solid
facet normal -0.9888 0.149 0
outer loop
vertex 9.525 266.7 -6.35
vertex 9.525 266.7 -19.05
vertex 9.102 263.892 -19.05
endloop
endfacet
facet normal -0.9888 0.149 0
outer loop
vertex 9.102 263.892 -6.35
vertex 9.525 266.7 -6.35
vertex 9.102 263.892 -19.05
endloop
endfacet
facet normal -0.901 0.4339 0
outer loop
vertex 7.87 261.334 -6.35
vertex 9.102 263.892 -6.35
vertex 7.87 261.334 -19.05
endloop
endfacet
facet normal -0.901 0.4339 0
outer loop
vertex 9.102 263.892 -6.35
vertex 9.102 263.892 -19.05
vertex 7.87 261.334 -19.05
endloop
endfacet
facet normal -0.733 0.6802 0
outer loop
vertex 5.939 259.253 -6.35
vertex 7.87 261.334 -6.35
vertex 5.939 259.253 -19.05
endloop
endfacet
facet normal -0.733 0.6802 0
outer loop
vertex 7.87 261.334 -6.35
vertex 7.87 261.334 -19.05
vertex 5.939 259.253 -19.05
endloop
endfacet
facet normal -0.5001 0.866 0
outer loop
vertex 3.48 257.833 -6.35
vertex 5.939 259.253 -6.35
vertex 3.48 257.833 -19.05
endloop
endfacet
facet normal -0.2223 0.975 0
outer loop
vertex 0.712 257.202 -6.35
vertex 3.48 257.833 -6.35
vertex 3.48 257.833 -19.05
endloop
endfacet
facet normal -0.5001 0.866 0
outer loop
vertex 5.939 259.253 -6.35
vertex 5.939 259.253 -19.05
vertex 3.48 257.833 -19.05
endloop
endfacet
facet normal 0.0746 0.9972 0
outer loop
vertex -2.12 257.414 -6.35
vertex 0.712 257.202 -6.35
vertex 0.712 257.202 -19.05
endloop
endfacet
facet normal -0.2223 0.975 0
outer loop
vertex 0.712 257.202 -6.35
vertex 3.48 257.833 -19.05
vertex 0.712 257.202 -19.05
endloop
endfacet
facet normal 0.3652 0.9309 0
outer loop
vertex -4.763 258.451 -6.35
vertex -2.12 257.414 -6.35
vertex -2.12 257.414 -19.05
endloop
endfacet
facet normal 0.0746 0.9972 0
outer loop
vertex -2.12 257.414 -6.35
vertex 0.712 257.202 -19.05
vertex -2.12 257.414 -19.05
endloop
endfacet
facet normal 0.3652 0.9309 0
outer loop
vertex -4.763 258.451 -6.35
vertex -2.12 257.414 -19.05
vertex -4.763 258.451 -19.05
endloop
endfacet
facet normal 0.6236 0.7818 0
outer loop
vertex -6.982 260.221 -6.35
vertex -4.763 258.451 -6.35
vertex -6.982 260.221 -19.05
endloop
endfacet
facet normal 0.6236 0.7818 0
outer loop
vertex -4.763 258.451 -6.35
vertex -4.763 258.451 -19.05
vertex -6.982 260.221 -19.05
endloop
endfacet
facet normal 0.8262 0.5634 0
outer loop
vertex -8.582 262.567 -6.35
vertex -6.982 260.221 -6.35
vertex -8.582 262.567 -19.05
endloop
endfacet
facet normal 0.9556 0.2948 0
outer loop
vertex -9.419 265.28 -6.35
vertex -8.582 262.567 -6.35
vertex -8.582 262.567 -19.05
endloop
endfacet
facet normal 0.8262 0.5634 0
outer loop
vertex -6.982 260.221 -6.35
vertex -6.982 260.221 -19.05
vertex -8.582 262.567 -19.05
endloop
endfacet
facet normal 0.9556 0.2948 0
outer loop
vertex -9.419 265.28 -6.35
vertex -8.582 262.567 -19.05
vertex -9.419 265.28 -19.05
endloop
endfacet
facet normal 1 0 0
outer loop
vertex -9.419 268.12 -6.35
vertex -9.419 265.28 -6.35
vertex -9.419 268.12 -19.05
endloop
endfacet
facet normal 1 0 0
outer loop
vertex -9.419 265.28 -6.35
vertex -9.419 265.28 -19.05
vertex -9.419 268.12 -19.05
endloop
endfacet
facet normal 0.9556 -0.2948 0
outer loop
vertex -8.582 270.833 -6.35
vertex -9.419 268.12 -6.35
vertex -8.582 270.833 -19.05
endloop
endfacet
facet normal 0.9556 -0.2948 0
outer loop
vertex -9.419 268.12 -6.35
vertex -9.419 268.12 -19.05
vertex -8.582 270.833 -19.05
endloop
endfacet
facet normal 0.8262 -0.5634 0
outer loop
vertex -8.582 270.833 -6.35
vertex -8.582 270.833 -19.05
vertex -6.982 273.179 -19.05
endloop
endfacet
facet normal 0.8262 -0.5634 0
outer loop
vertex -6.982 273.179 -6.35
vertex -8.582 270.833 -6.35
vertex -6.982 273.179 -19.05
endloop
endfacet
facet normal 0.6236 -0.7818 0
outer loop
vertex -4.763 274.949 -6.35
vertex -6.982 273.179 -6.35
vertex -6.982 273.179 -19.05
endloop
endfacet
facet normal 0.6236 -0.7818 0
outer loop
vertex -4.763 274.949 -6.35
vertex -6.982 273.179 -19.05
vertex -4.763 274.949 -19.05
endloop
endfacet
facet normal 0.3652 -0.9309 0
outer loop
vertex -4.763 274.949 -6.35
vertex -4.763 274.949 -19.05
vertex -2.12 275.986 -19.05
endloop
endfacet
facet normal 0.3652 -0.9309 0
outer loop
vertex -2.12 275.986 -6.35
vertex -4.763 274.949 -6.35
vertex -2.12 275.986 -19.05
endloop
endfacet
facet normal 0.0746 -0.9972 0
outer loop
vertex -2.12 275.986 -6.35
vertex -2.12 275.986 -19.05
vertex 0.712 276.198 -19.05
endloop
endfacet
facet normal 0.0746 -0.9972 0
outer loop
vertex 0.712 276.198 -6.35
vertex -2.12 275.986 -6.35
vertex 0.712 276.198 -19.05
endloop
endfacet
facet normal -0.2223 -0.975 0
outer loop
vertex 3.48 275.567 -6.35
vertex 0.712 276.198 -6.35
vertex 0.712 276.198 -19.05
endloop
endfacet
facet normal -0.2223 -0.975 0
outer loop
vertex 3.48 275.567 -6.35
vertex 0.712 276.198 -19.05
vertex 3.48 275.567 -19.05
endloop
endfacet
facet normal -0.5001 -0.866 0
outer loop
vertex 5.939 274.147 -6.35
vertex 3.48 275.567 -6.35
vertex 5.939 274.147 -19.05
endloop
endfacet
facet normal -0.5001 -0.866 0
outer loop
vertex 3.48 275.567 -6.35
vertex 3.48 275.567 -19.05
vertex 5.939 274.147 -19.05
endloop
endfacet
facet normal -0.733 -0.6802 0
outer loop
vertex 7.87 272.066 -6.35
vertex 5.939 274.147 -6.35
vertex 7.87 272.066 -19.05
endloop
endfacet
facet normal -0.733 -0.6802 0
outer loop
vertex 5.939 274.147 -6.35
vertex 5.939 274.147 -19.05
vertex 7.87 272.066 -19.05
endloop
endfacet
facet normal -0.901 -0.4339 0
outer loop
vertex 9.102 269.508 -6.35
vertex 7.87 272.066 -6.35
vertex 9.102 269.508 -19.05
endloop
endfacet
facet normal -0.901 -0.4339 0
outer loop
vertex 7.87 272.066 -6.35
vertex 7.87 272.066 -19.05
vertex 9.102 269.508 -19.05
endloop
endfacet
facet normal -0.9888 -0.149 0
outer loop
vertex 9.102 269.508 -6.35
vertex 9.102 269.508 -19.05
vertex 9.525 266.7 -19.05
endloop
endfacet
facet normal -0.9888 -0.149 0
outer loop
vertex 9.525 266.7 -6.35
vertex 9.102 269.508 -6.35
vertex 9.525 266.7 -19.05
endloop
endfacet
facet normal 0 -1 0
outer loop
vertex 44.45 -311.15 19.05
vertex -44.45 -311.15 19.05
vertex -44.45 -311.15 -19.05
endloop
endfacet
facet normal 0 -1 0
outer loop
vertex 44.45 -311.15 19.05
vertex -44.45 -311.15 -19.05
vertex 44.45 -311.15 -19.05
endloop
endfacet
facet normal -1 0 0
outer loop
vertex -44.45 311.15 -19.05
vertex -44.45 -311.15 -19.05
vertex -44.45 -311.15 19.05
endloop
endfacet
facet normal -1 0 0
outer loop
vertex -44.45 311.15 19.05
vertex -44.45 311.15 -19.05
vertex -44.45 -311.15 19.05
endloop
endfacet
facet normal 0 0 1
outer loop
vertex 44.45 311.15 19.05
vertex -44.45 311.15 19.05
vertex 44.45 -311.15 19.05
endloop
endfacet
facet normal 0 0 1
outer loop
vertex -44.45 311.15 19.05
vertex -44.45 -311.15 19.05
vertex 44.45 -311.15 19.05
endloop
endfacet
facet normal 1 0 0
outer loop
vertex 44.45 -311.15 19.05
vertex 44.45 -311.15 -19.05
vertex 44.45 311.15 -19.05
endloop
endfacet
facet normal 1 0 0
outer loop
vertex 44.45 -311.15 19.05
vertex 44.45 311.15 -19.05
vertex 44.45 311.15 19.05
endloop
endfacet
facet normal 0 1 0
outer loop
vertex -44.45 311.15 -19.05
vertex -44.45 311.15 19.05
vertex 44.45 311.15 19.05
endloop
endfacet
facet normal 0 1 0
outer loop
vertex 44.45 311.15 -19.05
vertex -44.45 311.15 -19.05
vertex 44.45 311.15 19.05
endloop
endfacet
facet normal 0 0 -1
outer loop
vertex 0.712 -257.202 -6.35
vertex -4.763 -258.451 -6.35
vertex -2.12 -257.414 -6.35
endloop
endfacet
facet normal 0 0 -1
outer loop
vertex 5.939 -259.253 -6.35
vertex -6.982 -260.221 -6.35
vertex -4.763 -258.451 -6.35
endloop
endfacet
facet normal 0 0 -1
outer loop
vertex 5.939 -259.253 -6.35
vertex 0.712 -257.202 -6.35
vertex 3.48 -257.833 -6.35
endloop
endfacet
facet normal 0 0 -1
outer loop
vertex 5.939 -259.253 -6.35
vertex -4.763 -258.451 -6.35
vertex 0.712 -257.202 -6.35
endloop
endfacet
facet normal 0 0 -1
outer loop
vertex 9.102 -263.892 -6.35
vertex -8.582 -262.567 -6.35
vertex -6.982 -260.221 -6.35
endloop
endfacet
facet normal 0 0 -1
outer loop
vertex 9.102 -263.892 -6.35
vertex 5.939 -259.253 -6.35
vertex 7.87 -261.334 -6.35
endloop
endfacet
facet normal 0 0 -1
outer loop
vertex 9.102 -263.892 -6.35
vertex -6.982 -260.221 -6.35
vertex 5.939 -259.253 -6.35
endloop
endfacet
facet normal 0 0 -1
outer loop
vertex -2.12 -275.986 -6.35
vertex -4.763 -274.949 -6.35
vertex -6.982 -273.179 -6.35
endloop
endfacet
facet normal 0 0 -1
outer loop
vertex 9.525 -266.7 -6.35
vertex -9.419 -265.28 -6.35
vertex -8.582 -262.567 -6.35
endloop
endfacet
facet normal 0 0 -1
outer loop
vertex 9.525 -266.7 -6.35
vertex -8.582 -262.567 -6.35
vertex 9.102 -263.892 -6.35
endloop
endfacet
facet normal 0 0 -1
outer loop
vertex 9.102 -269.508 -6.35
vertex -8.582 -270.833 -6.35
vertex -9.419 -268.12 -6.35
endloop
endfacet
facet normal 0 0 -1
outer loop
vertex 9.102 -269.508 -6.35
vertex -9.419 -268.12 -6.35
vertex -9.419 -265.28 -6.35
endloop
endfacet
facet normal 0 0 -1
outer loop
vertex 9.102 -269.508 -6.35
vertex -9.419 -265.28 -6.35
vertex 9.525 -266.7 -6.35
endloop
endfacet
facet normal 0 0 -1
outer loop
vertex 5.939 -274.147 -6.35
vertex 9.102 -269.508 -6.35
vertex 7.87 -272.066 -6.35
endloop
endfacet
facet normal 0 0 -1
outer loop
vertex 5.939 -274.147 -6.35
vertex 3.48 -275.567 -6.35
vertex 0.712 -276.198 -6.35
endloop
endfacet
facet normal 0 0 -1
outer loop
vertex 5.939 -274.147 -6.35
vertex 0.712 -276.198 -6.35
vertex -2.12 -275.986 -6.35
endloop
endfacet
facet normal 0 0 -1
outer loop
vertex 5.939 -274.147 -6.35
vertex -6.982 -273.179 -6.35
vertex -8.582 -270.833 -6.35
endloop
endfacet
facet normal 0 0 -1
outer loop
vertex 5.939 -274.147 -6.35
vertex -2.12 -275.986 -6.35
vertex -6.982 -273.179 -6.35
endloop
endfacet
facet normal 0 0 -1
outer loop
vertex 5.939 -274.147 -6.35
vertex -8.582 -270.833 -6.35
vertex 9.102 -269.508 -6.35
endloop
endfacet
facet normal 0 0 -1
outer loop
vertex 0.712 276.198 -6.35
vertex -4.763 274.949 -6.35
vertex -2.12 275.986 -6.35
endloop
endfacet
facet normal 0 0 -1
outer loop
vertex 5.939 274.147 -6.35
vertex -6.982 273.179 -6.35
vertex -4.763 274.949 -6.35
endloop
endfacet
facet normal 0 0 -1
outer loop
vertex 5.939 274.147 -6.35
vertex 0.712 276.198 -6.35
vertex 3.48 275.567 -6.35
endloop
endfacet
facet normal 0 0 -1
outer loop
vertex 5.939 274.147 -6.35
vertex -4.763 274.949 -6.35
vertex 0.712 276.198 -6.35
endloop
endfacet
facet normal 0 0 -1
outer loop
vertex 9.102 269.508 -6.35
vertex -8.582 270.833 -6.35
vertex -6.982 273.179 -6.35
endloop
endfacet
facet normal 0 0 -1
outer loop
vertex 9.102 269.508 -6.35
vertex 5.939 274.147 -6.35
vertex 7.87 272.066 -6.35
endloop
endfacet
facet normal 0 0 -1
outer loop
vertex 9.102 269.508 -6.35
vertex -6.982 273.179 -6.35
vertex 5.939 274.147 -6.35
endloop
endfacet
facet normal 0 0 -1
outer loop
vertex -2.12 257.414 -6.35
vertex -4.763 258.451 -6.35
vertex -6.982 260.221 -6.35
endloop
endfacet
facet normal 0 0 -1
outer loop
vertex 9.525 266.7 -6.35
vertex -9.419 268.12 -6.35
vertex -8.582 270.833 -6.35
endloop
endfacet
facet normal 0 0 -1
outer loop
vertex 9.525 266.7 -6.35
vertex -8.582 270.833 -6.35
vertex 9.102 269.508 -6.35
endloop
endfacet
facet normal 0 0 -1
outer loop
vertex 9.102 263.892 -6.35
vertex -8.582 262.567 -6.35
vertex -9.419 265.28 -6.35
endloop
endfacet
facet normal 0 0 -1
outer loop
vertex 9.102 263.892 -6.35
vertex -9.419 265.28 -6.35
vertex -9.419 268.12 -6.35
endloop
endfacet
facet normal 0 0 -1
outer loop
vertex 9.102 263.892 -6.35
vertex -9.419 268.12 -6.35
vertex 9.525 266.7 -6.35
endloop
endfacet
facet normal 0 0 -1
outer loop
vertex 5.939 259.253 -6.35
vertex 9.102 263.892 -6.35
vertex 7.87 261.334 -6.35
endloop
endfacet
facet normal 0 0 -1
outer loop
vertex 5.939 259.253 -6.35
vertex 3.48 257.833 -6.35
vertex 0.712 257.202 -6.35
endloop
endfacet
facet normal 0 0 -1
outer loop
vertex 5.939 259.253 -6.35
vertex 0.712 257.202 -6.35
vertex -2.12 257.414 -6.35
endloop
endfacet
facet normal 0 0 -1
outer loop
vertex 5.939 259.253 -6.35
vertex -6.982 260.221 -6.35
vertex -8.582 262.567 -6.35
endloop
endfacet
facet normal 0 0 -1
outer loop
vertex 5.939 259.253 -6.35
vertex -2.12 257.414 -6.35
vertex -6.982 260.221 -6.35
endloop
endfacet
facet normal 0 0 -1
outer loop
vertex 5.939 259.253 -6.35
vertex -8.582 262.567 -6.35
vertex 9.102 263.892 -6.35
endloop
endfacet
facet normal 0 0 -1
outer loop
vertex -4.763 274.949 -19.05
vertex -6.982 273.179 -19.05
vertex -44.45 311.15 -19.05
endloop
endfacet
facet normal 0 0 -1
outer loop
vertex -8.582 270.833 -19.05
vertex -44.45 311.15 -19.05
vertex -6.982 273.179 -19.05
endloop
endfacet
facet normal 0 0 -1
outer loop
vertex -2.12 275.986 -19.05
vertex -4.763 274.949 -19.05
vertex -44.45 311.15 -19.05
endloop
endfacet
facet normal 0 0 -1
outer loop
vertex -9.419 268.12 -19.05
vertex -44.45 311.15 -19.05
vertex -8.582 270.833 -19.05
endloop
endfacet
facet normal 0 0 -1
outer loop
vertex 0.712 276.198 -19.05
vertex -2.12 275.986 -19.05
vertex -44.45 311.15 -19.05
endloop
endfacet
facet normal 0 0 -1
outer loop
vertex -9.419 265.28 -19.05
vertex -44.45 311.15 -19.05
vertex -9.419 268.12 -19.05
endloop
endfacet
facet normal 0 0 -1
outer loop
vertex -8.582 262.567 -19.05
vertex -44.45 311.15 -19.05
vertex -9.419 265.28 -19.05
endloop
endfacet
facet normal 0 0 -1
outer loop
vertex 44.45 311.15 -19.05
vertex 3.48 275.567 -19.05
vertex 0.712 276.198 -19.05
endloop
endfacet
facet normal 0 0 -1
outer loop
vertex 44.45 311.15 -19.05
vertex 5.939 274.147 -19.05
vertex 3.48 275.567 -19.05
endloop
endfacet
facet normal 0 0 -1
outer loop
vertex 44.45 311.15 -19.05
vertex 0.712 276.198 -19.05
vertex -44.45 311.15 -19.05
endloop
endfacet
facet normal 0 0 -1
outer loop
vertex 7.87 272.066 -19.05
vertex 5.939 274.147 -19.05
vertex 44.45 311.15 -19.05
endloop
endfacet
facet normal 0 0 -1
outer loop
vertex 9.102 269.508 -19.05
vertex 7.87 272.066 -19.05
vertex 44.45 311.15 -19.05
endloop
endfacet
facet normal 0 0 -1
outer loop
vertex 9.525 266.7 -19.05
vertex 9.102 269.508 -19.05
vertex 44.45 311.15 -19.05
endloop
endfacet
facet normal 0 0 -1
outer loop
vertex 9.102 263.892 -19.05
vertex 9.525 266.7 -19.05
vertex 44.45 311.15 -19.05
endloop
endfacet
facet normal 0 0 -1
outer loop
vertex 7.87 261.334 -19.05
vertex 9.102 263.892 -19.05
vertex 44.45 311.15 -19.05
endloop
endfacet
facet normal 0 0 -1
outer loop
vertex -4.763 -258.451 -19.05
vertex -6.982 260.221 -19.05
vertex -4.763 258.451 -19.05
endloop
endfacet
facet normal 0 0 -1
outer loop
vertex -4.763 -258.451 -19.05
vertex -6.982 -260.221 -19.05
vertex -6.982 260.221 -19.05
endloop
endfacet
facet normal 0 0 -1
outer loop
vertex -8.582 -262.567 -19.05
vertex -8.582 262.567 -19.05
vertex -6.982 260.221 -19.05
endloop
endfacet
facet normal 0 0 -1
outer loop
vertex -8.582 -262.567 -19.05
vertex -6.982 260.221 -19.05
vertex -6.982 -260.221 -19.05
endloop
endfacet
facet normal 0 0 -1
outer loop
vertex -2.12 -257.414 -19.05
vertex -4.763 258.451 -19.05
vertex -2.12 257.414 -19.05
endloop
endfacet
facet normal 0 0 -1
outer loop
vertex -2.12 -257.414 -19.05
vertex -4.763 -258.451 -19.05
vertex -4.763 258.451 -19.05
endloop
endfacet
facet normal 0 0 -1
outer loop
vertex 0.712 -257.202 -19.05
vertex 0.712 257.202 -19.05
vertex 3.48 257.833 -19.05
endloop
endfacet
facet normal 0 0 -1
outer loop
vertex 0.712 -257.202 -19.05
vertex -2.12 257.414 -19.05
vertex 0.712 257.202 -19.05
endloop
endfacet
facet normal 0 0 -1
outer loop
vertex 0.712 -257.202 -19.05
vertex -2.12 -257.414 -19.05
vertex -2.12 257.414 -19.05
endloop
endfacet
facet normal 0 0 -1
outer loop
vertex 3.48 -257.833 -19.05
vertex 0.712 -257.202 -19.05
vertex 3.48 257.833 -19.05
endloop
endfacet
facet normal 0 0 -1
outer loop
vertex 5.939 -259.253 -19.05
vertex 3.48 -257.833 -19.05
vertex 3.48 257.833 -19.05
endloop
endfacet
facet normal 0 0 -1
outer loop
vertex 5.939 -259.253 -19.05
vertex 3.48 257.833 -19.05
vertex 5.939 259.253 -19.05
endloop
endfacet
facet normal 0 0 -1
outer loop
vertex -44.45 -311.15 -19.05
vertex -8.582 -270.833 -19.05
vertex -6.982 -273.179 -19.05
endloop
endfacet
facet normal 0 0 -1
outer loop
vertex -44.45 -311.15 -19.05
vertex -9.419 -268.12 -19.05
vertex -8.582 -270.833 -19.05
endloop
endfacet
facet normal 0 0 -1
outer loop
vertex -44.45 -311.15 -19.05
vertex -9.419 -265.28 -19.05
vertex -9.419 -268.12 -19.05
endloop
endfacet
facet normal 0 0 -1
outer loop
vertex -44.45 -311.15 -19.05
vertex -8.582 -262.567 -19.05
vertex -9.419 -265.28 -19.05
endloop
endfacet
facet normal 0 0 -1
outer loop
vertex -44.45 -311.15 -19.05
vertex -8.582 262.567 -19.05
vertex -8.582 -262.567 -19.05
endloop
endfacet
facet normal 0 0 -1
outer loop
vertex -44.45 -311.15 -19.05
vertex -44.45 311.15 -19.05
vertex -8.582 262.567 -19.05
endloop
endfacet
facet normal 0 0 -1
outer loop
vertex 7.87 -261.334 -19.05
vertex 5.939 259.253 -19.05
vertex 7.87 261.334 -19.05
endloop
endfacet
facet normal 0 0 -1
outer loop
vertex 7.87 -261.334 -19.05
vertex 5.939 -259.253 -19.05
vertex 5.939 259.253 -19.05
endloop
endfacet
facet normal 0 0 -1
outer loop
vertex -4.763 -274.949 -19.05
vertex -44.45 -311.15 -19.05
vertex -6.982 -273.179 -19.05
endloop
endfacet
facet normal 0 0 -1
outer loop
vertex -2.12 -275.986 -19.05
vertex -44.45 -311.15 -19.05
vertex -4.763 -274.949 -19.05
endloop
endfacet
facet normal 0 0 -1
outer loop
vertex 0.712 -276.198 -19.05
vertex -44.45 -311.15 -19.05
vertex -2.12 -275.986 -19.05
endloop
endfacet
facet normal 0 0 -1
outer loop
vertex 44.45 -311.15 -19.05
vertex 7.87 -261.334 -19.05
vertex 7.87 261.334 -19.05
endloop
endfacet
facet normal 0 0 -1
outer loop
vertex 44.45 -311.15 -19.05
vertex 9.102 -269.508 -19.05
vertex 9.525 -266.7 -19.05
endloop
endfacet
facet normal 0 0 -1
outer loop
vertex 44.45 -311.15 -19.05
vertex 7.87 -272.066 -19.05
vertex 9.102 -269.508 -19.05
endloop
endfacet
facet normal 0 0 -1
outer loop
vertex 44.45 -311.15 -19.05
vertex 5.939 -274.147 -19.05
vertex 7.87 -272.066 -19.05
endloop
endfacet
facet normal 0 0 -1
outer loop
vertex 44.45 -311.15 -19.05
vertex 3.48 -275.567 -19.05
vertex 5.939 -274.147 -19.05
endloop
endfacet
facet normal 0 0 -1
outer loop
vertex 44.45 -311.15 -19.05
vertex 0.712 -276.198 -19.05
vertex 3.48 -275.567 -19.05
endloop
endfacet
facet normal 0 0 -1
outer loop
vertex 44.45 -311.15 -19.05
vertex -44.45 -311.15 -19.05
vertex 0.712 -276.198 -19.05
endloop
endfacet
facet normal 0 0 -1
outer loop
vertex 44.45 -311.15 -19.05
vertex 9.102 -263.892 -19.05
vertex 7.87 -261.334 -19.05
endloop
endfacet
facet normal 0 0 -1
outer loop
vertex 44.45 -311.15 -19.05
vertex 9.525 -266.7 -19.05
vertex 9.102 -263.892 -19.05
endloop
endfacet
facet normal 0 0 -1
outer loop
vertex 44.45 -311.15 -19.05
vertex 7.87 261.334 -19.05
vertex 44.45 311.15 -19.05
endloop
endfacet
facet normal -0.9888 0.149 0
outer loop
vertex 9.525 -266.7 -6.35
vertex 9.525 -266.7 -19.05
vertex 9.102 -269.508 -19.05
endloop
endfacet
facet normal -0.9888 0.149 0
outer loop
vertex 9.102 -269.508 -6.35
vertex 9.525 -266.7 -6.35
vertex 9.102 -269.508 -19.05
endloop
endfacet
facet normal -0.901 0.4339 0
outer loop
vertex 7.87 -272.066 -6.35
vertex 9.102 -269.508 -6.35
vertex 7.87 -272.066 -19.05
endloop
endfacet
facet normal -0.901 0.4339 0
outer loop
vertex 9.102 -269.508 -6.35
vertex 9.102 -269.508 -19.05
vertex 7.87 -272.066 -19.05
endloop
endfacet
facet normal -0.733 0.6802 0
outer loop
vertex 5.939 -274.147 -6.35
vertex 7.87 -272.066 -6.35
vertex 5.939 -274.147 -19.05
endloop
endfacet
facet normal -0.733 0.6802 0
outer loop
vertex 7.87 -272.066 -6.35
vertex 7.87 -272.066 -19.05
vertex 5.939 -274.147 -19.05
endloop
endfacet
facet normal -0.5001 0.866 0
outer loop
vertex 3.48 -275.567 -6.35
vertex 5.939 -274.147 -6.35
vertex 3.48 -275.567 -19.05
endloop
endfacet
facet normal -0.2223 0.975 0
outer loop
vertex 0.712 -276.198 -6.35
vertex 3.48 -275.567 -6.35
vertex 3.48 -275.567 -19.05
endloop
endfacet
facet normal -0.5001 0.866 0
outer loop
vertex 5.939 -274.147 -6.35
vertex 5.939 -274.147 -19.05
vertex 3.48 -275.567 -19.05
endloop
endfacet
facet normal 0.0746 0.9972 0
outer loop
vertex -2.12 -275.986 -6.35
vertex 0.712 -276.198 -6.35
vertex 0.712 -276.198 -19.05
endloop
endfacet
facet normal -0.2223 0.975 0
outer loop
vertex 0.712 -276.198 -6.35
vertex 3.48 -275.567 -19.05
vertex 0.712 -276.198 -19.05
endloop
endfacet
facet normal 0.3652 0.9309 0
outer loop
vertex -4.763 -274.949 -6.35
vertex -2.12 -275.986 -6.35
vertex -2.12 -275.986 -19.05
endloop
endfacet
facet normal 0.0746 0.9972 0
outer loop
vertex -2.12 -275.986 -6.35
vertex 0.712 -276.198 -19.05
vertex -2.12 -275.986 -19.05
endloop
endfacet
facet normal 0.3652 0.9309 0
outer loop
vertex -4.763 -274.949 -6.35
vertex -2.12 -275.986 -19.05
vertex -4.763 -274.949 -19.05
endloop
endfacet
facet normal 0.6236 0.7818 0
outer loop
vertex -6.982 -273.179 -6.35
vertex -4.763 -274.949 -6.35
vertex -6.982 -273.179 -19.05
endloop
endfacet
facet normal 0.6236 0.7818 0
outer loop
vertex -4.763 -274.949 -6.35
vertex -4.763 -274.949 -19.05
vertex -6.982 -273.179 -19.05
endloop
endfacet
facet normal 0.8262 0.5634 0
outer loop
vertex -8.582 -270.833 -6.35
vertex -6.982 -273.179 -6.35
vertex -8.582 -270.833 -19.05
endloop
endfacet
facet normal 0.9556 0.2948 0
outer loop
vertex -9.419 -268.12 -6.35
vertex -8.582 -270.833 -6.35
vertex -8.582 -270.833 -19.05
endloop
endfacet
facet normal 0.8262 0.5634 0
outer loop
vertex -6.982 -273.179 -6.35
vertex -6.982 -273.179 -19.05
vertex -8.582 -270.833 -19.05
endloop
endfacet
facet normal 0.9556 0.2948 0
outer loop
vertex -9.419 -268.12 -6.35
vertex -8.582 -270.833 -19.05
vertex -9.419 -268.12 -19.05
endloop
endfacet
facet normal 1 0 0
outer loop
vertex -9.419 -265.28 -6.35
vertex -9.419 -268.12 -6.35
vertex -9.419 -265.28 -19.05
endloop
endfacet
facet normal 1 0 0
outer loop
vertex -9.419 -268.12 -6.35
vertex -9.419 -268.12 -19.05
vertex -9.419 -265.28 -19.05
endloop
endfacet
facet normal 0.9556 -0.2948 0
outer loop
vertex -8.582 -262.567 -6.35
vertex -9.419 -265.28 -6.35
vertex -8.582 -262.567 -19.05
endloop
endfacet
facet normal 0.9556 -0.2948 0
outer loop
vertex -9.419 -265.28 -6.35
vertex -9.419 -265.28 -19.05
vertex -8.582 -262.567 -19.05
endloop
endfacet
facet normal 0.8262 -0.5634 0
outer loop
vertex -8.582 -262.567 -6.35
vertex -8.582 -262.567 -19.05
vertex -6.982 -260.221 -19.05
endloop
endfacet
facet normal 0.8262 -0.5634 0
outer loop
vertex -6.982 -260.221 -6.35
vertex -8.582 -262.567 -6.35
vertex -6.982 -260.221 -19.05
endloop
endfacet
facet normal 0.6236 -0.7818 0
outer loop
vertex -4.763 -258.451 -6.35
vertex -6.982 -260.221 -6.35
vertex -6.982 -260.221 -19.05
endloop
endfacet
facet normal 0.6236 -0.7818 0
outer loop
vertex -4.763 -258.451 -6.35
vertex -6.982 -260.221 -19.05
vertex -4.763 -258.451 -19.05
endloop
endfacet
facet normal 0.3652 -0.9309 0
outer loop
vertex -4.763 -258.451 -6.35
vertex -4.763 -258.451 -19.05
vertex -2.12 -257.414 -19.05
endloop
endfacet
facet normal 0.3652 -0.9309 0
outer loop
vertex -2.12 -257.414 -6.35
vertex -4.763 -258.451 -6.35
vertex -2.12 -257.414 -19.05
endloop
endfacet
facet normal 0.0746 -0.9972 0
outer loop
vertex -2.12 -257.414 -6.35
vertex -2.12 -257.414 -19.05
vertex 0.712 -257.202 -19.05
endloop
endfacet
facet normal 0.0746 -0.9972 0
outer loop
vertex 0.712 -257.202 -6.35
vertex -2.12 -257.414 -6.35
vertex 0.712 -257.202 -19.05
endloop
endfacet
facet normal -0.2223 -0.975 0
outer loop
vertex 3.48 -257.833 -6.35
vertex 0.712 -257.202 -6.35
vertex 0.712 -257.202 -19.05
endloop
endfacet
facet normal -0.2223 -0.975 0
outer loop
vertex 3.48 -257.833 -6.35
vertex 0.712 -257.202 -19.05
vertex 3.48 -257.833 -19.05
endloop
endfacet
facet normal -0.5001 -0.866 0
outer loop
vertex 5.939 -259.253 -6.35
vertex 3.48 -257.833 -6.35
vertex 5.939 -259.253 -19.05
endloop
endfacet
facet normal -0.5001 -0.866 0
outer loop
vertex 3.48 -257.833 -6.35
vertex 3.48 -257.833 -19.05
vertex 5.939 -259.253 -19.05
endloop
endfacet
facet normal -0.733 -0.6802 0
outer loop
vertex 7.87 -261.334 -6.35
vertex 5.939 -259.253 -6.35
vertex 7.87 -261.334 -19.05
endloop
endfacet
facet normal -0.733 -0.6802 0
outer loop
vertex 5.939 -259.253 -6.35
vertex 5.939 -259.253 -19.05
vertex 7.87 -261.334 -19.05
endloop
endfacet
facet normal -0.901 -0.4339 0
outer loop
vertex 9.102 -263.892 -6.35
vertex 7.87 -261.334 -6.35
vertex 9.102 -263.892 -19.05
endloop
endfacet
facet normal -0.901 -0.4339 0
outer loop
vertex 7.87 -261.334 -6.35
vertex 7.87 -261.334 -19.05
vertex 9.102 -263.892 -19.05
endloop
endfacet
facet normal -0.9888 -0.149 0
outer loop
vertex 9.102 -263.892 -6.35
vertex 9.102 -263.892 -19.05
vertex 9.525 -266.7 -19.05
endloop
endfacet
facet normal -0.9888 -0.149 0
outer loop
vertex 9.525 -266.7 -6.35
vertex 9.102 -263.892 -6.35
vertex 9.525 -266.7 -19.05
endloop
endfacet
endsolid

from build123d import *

# Parameters (mm, degrees)
F0_W     = 88.9
F0_H     = 38.1
F1_DEPTH = 311.15
F2_R     = 9.525
F3_DEPTH = 12.7


with BuildPart() as f1:
    # F0 (on Front) → F1 (new body, symmetric)
    with BuildSketch(Plane.XZ):
        Rectangle(F0_W, F0_H)
    extrude(amount=F1_DEPTH, both=True)

    # F2 (on face) → F3 (cut)
    with BuildSketch(Plane(origin=(0, 0, -19.05), x_dir=(1, 0, 0), z_dir=(0, 0, -1))):
        with Locations((0, 266.7)):
            Circle(F2_R)
        with Locations((0, -266.7)):
            Circle(F2_R)
    extrude(amount=-F3_DEPTH, mode=Mode.SUBTRACT)


solid = f1.part
